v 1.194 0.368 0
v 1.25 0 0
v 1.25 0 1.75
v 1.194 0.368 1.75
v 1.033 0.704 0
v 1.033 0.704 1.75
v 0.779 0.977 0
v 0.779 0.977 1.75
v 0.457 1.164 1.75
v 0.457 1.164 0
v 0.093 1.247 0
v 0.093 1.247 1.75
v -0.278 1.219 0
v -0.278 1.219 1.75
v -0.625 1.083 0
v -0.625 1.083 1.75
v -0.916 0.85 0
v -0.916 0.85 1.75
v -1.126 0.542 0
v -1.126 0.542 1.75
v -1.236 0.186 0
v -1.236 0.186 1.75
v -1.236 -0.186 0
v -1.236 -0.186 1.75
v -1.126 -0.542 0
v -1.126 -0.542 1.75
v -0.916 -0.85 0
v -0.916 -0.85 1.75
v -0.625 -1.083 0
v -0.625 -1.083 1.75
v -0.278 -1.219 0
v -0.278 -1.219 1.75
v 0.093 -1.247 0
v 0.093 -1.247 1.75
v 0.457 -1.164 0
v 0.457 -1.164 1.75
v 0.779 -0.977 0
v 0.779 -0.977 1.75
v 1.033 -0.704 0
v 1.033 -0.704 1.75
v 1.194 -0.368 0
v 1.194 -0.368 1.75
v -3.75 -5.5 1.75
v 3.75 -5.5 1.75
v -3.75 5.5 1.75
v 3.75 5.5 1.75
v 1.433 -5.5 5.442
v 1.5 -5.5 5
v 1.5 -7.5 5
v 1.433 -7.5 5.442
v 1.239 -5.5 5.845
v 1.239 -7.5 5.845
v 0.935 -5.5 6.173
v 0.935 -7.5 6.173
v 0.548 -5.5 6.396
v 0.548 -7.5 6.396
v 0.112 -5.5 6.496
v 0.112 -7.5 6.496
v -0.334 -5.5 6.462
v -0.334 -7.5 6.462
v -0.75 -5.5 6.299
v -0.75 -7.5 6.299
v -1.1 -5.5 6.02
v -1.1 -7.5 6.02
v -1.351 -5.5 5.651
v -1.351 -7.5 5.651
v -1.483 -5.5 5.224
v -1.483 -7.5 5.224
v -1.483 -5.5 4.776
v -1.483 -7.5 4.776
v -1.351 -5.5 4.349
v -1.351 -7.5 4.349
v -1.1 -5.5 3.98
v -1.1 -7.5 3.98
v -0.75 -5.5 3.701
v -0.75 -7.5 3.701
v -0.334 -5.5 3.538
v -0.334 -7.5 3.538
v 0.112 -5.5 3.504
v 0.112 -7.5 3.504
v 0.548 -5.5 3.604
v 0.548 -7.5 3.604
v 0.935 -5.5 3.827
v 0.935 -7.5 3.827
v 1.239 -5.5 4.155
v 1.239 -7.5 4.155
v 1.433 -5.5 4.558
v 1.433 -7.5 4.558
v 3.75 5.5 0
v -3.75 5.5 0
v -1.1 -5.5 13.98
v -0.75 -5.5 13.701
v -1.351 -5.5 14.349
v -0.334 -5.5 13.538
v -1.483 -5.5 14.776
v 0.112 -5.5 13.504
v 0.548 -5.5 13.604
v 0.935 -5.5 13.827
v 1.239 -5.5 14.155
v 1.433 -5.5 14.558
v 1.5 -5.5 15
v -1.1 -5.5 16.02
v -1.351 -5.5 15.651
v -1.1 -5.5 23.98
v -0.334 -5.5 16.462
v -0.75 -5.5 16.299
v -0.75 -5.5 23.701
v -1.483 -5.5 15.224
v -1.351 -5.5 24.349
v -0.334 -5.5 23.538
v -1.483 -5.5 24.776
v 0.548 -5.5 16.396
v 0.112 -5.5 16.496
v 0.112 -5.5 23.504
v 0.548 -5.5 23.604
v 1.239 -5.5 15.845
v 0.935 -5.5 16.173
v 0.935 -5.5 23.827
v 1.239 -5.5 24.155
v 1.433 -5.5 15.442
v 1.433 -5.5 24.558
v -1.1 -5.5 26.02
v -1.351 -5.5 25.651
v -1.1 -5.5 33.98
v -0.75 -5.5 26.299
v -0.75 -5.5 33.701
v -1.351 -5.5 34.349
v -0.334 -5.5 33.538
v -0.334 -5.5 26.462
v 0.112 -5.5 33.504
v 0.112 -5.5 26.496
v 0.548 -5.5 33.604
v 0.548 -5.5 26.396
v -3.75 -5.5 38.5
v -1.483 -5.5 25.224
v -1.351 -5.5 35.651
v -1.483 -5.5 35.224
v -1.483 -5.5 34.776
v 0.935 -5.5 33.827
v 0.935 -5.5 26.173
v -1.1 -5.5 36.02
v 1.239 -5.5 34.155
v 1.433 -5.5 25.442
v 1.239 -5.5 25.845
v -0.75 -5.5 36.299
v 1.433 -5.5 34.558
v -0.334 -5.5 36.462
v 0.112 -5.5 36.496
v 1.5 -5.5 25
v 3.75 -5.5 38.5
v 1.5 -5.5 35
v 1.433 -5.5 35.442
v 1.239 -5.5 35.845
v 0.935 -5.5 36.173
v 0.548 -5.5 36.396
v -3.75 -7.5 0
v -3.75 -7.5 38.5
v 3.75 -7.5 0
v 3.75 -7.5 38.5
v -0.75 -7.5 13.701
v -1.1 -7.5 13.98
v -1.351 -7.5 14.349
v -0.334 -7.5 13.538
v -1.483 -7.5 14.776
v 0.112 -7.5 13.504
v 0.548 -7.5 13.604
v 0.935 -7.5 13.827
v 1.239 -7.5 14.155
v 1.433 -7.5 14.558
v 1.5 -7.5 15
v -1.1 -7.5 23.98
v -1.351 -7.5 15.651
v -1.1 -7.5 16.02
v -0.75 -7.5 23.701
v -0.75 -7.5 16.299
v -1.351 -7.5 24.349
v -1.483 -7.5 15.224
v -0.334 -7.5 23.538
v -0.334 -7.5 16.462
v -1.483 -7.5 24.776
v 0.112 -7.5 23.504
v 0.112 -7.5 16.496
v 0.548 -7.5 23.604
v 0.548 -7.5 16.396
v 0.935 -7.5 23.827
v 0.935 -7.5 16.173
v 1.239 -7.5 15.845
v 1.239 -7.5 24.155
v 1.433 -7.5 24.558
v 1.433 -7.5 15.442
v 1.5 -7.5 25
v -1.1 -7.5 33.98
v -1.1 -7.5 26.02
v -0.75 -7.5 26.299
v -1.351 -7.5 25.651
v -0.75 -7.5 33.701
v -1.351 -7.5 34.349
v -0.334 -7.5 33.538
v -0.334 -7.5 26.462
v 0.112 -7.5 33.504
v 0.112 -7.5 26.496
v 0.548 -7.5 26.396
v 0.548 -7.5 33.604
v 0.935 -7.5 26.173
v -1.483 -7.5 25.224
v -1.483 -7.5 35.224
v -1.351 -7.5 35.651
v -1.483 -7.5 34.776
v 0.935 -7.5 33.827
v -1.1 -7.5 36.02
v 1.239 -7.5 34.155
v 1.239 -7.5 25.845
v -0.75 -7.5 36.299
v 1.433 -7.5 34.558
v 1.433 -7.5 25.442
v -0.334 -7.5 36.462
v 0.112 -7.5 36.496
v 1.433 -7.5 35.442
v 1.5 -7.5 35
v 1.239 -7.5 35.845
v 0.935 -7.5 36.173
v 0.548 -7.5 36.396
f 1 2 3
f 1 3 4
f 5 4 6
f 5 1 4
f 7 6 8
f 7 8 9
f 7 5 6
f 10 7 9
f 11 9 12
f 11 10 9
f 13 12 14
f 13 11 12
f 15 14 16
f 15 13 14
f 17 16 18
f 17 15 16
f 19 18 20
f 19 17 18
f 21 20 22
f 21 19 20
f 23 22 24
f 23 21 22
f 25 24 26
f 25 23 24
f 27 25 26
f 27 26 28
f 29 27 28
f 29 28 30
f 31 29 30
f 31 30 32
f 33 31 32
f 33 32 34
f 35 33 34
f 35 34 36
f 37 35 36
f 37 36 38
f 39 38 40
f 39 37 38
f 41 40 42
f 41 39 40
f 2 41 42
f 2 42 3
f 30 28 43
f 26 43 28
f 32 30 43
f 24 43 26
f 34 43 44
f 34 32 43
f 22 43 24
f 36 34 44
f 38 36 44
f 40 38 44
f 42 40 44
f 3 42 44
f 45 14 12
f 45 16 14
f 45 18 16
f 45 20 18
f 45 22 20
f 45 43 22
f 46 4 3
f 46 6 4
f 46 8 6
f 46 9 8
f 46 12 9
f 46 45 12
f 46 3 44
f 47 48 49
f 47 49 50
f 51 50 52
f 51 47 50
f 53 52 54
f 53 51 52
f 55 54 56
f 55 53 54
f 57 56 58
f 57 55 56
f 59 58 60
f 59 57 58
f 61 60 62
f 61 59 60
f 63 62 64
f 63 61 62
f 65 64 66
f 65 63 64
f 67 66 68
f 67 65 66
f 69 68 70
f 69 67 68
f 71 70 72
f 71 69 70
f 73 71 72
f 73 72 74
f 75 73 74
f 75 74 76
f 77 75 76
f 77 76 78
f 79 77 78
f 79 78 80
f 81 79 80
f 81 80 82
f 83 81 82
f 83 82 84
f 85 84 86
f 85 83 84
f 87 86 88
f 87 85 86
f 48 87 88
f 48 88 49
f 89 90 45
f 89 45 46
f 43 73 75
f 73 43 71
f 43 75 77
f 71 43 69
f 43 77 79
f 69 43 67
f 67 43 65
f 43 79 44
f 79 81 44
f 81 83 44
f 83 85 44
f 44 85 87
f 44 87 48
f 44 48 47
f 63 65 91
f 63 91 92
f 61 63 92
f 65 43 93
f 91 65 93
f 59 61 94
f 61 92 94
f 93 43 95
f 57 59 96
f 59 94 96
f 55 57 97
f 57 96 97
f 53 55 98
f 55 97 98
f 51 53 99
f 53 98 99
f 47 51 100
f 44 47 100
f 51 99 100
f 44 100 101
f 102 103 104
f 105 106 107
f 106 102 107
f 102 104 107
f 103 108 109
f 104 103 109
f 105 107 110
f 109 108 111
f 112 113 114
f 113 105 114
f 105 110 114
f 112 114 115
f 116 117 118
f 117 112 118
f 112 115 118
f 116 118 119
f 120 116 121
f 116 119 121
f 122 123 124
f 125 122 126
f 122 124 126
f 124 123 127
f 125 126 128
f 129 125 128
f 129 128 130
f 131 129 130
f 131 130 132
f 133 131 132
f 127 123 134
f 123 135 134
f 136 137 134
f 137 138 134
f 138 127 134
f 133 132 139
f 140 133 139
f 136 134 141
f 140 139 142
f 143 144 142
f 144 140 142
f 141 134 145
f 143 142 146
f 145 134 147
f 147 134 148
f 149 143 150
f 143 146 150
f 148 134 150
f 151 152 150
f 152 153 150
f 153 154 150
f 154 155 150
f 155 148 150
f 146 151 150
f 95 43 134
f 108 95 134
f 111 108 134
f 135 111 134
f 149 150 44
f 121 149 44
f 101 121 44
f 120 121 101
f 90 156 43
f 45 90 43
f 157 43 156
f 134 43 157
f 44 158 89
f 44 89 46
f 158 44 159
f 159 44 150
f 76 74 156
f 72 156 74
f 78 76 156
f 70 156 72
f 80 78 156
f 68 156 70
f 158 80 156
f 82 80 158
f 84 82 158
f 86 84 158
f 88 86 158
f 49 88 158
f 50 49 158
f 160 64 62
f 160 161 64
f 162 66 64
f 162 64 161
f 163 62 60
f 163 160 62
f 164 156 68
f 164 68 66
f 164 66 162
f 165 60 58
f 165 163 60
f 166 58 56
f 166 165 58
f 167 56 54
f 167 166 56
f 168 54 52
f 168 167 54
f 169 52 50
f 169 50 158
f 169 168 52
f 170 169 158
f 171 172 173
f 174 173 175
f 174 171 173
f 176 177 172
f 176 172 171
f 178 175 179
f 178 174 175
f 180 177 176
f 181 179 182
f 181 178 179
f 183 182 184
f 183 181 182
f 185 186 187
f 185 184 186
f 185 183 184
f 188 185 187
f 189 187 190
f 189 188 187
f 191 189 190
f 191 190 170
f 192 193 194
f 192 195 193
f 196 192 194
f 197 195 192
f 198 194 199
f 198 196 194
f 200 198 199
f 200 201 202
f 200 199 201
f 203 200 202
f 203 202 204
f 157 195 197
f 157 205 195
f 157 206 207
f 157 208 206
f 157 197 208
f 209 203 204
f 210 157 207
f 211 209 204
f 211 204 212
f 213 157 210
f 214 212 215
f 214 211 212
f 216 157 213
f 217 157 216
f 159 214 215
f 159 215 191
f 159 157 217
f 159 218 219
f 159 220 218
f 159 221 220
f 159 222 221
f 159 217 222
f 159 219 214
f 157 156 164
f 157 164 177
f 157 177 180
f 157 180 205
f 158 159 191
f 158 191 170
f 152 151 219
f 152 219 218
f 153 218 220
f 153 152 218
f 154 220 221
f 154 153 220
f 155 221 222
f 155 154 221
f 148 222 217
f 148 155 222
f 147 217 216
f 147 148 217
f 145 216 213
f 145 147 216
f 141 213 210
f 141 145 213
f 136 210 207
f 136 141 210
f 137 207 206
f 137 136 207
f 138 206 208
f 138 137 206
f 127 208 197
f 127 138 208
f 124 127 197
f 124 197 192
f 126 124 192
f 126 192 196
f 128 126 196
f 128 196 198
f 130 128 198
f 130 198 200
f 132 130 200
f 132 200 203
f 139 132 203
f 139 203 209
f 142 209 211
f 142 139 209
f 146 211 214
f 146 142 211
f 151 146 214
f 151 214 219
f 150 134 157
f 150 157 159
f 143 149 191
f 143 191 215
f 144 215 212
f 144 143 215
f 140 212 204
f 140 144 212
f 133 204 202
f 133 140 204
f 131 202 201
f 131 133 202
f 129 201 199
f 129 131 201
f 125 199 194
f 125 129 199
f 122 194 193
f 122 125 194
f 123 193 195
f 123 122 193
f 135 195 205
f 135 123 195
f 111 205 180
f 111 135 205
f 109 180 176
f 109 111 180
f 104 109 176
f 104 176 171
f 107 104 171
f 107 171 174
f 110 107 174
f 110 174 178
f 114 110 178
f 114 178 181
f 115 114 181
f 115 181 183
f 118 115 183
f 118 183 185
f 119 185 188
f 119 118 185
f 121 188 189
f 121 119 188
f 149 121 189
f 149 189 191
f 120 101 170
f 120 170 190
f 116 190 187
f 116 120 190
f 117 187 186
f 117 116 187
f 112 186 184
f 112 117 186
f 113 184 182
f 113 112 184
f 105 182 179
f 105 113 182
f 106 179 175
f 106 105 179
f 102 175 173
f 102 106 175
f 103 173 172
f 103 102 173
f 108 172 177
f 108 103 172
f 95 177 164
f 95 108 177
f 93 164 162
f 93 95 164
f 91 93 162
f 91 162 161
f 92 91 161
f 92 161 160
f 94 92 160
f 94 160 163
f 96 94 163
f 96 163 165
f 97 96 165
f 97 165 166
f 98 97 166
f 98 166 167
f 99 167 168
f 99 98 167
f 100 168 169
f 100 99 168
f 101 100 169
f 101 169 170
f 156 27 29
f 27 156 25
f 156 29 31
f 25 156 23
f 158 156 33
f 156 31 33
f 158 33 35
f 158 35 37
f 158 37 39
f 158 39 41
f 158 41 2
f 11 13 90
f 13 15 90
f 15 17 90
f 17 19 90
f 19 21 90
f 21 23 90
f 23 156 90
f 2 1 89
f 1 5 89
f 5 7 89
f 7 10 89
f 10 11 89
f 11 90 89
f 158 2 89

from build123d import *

# Parameters (mm, degrees)
SKETCH_W     = 7.5
SKETCH_H     = 11
SKETCH_R     = 1.25
PAD_DEPTH    = 1.75
SKETCH001_W  = 7.5
SKETCH001_H  = 38.5
SKETCH001_R  = 1.5
PAD001_DEPTH = 2


with BuildPart() as part:
    # Sketch → Pad (new body)
    with BuildSketch(Plane.XY):
        Rectangle(SKETCH_W, SKETCH_H)
        Circle(SKETCH_R, mode=Mode.SUBTRACT)
    extrude(amount=PAD_DEPTH)

    # Sketch001 (on Face3 of Pad) → Pad001 (join)
    with BuildSketch(Plane.XZ.offset(5.5)):
        with Locations((0, 19.25)):
            Rectangle(SKETCH001_W, SKETCH001_H)
        with Locations((0, 5)):
            Circle(SKETCH001_R, mode=Mode.SUBTRACT)
        with Locations((0, 15)):
            Circle(SKETCH001_R, mode=Mode.SUBTRACT)
        with Locations((0, 25)):
            Circle(SKETCH001_R, mode=Mode.SUBTRACT)
        with Locations((0, 35)):
            Circle(SKETCH001_R, mode=Mode.SUBTRACT)
    extrude(amount=PAD001_DEPTH)


solid = part.part
